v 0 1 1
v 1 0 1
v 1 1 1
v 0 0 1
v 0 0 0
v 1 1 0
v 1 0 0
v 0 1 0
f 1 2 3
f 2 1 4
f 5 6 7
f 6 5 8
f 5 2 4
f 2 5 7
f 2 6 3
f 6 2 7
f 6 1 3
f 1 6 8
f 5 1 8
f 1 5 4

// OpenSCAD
//Test how well arrays of inicode string are accessed.

texts_array = [
"DEADBEEF",
"Ленивый рыжий кот",
"كسول الزنجبيل القط"
,
"懶惰的姜貓",

"äöü ÄÖÜ ß",
"😁😂😃😄😅😆😇😈😉😊😋😌😍😎😏😐",
"⠁⠂⠃⠄⠅⠆⠇⠈⠉⠊⠋⠌⠍⠎⠏",
"🂡🂱🃁🃑",

];




for (text_array_idx = [0:(len(texts_array)-1)])
{
	echo( "Array element=", text_array_idx, "for", texts_array[text_array_idx], " of len=", len(texts_array[text_array_idx]), "[0]=", texts_array[text_array_idx][0],":"  );

for (text_idx = [0:(len(texts_array[text_array_idx])-1)])
{
	echo( "    [", text_idx, ,"]=", texts_array[text_array_idx][text_idx]  );
}


}


cube();
